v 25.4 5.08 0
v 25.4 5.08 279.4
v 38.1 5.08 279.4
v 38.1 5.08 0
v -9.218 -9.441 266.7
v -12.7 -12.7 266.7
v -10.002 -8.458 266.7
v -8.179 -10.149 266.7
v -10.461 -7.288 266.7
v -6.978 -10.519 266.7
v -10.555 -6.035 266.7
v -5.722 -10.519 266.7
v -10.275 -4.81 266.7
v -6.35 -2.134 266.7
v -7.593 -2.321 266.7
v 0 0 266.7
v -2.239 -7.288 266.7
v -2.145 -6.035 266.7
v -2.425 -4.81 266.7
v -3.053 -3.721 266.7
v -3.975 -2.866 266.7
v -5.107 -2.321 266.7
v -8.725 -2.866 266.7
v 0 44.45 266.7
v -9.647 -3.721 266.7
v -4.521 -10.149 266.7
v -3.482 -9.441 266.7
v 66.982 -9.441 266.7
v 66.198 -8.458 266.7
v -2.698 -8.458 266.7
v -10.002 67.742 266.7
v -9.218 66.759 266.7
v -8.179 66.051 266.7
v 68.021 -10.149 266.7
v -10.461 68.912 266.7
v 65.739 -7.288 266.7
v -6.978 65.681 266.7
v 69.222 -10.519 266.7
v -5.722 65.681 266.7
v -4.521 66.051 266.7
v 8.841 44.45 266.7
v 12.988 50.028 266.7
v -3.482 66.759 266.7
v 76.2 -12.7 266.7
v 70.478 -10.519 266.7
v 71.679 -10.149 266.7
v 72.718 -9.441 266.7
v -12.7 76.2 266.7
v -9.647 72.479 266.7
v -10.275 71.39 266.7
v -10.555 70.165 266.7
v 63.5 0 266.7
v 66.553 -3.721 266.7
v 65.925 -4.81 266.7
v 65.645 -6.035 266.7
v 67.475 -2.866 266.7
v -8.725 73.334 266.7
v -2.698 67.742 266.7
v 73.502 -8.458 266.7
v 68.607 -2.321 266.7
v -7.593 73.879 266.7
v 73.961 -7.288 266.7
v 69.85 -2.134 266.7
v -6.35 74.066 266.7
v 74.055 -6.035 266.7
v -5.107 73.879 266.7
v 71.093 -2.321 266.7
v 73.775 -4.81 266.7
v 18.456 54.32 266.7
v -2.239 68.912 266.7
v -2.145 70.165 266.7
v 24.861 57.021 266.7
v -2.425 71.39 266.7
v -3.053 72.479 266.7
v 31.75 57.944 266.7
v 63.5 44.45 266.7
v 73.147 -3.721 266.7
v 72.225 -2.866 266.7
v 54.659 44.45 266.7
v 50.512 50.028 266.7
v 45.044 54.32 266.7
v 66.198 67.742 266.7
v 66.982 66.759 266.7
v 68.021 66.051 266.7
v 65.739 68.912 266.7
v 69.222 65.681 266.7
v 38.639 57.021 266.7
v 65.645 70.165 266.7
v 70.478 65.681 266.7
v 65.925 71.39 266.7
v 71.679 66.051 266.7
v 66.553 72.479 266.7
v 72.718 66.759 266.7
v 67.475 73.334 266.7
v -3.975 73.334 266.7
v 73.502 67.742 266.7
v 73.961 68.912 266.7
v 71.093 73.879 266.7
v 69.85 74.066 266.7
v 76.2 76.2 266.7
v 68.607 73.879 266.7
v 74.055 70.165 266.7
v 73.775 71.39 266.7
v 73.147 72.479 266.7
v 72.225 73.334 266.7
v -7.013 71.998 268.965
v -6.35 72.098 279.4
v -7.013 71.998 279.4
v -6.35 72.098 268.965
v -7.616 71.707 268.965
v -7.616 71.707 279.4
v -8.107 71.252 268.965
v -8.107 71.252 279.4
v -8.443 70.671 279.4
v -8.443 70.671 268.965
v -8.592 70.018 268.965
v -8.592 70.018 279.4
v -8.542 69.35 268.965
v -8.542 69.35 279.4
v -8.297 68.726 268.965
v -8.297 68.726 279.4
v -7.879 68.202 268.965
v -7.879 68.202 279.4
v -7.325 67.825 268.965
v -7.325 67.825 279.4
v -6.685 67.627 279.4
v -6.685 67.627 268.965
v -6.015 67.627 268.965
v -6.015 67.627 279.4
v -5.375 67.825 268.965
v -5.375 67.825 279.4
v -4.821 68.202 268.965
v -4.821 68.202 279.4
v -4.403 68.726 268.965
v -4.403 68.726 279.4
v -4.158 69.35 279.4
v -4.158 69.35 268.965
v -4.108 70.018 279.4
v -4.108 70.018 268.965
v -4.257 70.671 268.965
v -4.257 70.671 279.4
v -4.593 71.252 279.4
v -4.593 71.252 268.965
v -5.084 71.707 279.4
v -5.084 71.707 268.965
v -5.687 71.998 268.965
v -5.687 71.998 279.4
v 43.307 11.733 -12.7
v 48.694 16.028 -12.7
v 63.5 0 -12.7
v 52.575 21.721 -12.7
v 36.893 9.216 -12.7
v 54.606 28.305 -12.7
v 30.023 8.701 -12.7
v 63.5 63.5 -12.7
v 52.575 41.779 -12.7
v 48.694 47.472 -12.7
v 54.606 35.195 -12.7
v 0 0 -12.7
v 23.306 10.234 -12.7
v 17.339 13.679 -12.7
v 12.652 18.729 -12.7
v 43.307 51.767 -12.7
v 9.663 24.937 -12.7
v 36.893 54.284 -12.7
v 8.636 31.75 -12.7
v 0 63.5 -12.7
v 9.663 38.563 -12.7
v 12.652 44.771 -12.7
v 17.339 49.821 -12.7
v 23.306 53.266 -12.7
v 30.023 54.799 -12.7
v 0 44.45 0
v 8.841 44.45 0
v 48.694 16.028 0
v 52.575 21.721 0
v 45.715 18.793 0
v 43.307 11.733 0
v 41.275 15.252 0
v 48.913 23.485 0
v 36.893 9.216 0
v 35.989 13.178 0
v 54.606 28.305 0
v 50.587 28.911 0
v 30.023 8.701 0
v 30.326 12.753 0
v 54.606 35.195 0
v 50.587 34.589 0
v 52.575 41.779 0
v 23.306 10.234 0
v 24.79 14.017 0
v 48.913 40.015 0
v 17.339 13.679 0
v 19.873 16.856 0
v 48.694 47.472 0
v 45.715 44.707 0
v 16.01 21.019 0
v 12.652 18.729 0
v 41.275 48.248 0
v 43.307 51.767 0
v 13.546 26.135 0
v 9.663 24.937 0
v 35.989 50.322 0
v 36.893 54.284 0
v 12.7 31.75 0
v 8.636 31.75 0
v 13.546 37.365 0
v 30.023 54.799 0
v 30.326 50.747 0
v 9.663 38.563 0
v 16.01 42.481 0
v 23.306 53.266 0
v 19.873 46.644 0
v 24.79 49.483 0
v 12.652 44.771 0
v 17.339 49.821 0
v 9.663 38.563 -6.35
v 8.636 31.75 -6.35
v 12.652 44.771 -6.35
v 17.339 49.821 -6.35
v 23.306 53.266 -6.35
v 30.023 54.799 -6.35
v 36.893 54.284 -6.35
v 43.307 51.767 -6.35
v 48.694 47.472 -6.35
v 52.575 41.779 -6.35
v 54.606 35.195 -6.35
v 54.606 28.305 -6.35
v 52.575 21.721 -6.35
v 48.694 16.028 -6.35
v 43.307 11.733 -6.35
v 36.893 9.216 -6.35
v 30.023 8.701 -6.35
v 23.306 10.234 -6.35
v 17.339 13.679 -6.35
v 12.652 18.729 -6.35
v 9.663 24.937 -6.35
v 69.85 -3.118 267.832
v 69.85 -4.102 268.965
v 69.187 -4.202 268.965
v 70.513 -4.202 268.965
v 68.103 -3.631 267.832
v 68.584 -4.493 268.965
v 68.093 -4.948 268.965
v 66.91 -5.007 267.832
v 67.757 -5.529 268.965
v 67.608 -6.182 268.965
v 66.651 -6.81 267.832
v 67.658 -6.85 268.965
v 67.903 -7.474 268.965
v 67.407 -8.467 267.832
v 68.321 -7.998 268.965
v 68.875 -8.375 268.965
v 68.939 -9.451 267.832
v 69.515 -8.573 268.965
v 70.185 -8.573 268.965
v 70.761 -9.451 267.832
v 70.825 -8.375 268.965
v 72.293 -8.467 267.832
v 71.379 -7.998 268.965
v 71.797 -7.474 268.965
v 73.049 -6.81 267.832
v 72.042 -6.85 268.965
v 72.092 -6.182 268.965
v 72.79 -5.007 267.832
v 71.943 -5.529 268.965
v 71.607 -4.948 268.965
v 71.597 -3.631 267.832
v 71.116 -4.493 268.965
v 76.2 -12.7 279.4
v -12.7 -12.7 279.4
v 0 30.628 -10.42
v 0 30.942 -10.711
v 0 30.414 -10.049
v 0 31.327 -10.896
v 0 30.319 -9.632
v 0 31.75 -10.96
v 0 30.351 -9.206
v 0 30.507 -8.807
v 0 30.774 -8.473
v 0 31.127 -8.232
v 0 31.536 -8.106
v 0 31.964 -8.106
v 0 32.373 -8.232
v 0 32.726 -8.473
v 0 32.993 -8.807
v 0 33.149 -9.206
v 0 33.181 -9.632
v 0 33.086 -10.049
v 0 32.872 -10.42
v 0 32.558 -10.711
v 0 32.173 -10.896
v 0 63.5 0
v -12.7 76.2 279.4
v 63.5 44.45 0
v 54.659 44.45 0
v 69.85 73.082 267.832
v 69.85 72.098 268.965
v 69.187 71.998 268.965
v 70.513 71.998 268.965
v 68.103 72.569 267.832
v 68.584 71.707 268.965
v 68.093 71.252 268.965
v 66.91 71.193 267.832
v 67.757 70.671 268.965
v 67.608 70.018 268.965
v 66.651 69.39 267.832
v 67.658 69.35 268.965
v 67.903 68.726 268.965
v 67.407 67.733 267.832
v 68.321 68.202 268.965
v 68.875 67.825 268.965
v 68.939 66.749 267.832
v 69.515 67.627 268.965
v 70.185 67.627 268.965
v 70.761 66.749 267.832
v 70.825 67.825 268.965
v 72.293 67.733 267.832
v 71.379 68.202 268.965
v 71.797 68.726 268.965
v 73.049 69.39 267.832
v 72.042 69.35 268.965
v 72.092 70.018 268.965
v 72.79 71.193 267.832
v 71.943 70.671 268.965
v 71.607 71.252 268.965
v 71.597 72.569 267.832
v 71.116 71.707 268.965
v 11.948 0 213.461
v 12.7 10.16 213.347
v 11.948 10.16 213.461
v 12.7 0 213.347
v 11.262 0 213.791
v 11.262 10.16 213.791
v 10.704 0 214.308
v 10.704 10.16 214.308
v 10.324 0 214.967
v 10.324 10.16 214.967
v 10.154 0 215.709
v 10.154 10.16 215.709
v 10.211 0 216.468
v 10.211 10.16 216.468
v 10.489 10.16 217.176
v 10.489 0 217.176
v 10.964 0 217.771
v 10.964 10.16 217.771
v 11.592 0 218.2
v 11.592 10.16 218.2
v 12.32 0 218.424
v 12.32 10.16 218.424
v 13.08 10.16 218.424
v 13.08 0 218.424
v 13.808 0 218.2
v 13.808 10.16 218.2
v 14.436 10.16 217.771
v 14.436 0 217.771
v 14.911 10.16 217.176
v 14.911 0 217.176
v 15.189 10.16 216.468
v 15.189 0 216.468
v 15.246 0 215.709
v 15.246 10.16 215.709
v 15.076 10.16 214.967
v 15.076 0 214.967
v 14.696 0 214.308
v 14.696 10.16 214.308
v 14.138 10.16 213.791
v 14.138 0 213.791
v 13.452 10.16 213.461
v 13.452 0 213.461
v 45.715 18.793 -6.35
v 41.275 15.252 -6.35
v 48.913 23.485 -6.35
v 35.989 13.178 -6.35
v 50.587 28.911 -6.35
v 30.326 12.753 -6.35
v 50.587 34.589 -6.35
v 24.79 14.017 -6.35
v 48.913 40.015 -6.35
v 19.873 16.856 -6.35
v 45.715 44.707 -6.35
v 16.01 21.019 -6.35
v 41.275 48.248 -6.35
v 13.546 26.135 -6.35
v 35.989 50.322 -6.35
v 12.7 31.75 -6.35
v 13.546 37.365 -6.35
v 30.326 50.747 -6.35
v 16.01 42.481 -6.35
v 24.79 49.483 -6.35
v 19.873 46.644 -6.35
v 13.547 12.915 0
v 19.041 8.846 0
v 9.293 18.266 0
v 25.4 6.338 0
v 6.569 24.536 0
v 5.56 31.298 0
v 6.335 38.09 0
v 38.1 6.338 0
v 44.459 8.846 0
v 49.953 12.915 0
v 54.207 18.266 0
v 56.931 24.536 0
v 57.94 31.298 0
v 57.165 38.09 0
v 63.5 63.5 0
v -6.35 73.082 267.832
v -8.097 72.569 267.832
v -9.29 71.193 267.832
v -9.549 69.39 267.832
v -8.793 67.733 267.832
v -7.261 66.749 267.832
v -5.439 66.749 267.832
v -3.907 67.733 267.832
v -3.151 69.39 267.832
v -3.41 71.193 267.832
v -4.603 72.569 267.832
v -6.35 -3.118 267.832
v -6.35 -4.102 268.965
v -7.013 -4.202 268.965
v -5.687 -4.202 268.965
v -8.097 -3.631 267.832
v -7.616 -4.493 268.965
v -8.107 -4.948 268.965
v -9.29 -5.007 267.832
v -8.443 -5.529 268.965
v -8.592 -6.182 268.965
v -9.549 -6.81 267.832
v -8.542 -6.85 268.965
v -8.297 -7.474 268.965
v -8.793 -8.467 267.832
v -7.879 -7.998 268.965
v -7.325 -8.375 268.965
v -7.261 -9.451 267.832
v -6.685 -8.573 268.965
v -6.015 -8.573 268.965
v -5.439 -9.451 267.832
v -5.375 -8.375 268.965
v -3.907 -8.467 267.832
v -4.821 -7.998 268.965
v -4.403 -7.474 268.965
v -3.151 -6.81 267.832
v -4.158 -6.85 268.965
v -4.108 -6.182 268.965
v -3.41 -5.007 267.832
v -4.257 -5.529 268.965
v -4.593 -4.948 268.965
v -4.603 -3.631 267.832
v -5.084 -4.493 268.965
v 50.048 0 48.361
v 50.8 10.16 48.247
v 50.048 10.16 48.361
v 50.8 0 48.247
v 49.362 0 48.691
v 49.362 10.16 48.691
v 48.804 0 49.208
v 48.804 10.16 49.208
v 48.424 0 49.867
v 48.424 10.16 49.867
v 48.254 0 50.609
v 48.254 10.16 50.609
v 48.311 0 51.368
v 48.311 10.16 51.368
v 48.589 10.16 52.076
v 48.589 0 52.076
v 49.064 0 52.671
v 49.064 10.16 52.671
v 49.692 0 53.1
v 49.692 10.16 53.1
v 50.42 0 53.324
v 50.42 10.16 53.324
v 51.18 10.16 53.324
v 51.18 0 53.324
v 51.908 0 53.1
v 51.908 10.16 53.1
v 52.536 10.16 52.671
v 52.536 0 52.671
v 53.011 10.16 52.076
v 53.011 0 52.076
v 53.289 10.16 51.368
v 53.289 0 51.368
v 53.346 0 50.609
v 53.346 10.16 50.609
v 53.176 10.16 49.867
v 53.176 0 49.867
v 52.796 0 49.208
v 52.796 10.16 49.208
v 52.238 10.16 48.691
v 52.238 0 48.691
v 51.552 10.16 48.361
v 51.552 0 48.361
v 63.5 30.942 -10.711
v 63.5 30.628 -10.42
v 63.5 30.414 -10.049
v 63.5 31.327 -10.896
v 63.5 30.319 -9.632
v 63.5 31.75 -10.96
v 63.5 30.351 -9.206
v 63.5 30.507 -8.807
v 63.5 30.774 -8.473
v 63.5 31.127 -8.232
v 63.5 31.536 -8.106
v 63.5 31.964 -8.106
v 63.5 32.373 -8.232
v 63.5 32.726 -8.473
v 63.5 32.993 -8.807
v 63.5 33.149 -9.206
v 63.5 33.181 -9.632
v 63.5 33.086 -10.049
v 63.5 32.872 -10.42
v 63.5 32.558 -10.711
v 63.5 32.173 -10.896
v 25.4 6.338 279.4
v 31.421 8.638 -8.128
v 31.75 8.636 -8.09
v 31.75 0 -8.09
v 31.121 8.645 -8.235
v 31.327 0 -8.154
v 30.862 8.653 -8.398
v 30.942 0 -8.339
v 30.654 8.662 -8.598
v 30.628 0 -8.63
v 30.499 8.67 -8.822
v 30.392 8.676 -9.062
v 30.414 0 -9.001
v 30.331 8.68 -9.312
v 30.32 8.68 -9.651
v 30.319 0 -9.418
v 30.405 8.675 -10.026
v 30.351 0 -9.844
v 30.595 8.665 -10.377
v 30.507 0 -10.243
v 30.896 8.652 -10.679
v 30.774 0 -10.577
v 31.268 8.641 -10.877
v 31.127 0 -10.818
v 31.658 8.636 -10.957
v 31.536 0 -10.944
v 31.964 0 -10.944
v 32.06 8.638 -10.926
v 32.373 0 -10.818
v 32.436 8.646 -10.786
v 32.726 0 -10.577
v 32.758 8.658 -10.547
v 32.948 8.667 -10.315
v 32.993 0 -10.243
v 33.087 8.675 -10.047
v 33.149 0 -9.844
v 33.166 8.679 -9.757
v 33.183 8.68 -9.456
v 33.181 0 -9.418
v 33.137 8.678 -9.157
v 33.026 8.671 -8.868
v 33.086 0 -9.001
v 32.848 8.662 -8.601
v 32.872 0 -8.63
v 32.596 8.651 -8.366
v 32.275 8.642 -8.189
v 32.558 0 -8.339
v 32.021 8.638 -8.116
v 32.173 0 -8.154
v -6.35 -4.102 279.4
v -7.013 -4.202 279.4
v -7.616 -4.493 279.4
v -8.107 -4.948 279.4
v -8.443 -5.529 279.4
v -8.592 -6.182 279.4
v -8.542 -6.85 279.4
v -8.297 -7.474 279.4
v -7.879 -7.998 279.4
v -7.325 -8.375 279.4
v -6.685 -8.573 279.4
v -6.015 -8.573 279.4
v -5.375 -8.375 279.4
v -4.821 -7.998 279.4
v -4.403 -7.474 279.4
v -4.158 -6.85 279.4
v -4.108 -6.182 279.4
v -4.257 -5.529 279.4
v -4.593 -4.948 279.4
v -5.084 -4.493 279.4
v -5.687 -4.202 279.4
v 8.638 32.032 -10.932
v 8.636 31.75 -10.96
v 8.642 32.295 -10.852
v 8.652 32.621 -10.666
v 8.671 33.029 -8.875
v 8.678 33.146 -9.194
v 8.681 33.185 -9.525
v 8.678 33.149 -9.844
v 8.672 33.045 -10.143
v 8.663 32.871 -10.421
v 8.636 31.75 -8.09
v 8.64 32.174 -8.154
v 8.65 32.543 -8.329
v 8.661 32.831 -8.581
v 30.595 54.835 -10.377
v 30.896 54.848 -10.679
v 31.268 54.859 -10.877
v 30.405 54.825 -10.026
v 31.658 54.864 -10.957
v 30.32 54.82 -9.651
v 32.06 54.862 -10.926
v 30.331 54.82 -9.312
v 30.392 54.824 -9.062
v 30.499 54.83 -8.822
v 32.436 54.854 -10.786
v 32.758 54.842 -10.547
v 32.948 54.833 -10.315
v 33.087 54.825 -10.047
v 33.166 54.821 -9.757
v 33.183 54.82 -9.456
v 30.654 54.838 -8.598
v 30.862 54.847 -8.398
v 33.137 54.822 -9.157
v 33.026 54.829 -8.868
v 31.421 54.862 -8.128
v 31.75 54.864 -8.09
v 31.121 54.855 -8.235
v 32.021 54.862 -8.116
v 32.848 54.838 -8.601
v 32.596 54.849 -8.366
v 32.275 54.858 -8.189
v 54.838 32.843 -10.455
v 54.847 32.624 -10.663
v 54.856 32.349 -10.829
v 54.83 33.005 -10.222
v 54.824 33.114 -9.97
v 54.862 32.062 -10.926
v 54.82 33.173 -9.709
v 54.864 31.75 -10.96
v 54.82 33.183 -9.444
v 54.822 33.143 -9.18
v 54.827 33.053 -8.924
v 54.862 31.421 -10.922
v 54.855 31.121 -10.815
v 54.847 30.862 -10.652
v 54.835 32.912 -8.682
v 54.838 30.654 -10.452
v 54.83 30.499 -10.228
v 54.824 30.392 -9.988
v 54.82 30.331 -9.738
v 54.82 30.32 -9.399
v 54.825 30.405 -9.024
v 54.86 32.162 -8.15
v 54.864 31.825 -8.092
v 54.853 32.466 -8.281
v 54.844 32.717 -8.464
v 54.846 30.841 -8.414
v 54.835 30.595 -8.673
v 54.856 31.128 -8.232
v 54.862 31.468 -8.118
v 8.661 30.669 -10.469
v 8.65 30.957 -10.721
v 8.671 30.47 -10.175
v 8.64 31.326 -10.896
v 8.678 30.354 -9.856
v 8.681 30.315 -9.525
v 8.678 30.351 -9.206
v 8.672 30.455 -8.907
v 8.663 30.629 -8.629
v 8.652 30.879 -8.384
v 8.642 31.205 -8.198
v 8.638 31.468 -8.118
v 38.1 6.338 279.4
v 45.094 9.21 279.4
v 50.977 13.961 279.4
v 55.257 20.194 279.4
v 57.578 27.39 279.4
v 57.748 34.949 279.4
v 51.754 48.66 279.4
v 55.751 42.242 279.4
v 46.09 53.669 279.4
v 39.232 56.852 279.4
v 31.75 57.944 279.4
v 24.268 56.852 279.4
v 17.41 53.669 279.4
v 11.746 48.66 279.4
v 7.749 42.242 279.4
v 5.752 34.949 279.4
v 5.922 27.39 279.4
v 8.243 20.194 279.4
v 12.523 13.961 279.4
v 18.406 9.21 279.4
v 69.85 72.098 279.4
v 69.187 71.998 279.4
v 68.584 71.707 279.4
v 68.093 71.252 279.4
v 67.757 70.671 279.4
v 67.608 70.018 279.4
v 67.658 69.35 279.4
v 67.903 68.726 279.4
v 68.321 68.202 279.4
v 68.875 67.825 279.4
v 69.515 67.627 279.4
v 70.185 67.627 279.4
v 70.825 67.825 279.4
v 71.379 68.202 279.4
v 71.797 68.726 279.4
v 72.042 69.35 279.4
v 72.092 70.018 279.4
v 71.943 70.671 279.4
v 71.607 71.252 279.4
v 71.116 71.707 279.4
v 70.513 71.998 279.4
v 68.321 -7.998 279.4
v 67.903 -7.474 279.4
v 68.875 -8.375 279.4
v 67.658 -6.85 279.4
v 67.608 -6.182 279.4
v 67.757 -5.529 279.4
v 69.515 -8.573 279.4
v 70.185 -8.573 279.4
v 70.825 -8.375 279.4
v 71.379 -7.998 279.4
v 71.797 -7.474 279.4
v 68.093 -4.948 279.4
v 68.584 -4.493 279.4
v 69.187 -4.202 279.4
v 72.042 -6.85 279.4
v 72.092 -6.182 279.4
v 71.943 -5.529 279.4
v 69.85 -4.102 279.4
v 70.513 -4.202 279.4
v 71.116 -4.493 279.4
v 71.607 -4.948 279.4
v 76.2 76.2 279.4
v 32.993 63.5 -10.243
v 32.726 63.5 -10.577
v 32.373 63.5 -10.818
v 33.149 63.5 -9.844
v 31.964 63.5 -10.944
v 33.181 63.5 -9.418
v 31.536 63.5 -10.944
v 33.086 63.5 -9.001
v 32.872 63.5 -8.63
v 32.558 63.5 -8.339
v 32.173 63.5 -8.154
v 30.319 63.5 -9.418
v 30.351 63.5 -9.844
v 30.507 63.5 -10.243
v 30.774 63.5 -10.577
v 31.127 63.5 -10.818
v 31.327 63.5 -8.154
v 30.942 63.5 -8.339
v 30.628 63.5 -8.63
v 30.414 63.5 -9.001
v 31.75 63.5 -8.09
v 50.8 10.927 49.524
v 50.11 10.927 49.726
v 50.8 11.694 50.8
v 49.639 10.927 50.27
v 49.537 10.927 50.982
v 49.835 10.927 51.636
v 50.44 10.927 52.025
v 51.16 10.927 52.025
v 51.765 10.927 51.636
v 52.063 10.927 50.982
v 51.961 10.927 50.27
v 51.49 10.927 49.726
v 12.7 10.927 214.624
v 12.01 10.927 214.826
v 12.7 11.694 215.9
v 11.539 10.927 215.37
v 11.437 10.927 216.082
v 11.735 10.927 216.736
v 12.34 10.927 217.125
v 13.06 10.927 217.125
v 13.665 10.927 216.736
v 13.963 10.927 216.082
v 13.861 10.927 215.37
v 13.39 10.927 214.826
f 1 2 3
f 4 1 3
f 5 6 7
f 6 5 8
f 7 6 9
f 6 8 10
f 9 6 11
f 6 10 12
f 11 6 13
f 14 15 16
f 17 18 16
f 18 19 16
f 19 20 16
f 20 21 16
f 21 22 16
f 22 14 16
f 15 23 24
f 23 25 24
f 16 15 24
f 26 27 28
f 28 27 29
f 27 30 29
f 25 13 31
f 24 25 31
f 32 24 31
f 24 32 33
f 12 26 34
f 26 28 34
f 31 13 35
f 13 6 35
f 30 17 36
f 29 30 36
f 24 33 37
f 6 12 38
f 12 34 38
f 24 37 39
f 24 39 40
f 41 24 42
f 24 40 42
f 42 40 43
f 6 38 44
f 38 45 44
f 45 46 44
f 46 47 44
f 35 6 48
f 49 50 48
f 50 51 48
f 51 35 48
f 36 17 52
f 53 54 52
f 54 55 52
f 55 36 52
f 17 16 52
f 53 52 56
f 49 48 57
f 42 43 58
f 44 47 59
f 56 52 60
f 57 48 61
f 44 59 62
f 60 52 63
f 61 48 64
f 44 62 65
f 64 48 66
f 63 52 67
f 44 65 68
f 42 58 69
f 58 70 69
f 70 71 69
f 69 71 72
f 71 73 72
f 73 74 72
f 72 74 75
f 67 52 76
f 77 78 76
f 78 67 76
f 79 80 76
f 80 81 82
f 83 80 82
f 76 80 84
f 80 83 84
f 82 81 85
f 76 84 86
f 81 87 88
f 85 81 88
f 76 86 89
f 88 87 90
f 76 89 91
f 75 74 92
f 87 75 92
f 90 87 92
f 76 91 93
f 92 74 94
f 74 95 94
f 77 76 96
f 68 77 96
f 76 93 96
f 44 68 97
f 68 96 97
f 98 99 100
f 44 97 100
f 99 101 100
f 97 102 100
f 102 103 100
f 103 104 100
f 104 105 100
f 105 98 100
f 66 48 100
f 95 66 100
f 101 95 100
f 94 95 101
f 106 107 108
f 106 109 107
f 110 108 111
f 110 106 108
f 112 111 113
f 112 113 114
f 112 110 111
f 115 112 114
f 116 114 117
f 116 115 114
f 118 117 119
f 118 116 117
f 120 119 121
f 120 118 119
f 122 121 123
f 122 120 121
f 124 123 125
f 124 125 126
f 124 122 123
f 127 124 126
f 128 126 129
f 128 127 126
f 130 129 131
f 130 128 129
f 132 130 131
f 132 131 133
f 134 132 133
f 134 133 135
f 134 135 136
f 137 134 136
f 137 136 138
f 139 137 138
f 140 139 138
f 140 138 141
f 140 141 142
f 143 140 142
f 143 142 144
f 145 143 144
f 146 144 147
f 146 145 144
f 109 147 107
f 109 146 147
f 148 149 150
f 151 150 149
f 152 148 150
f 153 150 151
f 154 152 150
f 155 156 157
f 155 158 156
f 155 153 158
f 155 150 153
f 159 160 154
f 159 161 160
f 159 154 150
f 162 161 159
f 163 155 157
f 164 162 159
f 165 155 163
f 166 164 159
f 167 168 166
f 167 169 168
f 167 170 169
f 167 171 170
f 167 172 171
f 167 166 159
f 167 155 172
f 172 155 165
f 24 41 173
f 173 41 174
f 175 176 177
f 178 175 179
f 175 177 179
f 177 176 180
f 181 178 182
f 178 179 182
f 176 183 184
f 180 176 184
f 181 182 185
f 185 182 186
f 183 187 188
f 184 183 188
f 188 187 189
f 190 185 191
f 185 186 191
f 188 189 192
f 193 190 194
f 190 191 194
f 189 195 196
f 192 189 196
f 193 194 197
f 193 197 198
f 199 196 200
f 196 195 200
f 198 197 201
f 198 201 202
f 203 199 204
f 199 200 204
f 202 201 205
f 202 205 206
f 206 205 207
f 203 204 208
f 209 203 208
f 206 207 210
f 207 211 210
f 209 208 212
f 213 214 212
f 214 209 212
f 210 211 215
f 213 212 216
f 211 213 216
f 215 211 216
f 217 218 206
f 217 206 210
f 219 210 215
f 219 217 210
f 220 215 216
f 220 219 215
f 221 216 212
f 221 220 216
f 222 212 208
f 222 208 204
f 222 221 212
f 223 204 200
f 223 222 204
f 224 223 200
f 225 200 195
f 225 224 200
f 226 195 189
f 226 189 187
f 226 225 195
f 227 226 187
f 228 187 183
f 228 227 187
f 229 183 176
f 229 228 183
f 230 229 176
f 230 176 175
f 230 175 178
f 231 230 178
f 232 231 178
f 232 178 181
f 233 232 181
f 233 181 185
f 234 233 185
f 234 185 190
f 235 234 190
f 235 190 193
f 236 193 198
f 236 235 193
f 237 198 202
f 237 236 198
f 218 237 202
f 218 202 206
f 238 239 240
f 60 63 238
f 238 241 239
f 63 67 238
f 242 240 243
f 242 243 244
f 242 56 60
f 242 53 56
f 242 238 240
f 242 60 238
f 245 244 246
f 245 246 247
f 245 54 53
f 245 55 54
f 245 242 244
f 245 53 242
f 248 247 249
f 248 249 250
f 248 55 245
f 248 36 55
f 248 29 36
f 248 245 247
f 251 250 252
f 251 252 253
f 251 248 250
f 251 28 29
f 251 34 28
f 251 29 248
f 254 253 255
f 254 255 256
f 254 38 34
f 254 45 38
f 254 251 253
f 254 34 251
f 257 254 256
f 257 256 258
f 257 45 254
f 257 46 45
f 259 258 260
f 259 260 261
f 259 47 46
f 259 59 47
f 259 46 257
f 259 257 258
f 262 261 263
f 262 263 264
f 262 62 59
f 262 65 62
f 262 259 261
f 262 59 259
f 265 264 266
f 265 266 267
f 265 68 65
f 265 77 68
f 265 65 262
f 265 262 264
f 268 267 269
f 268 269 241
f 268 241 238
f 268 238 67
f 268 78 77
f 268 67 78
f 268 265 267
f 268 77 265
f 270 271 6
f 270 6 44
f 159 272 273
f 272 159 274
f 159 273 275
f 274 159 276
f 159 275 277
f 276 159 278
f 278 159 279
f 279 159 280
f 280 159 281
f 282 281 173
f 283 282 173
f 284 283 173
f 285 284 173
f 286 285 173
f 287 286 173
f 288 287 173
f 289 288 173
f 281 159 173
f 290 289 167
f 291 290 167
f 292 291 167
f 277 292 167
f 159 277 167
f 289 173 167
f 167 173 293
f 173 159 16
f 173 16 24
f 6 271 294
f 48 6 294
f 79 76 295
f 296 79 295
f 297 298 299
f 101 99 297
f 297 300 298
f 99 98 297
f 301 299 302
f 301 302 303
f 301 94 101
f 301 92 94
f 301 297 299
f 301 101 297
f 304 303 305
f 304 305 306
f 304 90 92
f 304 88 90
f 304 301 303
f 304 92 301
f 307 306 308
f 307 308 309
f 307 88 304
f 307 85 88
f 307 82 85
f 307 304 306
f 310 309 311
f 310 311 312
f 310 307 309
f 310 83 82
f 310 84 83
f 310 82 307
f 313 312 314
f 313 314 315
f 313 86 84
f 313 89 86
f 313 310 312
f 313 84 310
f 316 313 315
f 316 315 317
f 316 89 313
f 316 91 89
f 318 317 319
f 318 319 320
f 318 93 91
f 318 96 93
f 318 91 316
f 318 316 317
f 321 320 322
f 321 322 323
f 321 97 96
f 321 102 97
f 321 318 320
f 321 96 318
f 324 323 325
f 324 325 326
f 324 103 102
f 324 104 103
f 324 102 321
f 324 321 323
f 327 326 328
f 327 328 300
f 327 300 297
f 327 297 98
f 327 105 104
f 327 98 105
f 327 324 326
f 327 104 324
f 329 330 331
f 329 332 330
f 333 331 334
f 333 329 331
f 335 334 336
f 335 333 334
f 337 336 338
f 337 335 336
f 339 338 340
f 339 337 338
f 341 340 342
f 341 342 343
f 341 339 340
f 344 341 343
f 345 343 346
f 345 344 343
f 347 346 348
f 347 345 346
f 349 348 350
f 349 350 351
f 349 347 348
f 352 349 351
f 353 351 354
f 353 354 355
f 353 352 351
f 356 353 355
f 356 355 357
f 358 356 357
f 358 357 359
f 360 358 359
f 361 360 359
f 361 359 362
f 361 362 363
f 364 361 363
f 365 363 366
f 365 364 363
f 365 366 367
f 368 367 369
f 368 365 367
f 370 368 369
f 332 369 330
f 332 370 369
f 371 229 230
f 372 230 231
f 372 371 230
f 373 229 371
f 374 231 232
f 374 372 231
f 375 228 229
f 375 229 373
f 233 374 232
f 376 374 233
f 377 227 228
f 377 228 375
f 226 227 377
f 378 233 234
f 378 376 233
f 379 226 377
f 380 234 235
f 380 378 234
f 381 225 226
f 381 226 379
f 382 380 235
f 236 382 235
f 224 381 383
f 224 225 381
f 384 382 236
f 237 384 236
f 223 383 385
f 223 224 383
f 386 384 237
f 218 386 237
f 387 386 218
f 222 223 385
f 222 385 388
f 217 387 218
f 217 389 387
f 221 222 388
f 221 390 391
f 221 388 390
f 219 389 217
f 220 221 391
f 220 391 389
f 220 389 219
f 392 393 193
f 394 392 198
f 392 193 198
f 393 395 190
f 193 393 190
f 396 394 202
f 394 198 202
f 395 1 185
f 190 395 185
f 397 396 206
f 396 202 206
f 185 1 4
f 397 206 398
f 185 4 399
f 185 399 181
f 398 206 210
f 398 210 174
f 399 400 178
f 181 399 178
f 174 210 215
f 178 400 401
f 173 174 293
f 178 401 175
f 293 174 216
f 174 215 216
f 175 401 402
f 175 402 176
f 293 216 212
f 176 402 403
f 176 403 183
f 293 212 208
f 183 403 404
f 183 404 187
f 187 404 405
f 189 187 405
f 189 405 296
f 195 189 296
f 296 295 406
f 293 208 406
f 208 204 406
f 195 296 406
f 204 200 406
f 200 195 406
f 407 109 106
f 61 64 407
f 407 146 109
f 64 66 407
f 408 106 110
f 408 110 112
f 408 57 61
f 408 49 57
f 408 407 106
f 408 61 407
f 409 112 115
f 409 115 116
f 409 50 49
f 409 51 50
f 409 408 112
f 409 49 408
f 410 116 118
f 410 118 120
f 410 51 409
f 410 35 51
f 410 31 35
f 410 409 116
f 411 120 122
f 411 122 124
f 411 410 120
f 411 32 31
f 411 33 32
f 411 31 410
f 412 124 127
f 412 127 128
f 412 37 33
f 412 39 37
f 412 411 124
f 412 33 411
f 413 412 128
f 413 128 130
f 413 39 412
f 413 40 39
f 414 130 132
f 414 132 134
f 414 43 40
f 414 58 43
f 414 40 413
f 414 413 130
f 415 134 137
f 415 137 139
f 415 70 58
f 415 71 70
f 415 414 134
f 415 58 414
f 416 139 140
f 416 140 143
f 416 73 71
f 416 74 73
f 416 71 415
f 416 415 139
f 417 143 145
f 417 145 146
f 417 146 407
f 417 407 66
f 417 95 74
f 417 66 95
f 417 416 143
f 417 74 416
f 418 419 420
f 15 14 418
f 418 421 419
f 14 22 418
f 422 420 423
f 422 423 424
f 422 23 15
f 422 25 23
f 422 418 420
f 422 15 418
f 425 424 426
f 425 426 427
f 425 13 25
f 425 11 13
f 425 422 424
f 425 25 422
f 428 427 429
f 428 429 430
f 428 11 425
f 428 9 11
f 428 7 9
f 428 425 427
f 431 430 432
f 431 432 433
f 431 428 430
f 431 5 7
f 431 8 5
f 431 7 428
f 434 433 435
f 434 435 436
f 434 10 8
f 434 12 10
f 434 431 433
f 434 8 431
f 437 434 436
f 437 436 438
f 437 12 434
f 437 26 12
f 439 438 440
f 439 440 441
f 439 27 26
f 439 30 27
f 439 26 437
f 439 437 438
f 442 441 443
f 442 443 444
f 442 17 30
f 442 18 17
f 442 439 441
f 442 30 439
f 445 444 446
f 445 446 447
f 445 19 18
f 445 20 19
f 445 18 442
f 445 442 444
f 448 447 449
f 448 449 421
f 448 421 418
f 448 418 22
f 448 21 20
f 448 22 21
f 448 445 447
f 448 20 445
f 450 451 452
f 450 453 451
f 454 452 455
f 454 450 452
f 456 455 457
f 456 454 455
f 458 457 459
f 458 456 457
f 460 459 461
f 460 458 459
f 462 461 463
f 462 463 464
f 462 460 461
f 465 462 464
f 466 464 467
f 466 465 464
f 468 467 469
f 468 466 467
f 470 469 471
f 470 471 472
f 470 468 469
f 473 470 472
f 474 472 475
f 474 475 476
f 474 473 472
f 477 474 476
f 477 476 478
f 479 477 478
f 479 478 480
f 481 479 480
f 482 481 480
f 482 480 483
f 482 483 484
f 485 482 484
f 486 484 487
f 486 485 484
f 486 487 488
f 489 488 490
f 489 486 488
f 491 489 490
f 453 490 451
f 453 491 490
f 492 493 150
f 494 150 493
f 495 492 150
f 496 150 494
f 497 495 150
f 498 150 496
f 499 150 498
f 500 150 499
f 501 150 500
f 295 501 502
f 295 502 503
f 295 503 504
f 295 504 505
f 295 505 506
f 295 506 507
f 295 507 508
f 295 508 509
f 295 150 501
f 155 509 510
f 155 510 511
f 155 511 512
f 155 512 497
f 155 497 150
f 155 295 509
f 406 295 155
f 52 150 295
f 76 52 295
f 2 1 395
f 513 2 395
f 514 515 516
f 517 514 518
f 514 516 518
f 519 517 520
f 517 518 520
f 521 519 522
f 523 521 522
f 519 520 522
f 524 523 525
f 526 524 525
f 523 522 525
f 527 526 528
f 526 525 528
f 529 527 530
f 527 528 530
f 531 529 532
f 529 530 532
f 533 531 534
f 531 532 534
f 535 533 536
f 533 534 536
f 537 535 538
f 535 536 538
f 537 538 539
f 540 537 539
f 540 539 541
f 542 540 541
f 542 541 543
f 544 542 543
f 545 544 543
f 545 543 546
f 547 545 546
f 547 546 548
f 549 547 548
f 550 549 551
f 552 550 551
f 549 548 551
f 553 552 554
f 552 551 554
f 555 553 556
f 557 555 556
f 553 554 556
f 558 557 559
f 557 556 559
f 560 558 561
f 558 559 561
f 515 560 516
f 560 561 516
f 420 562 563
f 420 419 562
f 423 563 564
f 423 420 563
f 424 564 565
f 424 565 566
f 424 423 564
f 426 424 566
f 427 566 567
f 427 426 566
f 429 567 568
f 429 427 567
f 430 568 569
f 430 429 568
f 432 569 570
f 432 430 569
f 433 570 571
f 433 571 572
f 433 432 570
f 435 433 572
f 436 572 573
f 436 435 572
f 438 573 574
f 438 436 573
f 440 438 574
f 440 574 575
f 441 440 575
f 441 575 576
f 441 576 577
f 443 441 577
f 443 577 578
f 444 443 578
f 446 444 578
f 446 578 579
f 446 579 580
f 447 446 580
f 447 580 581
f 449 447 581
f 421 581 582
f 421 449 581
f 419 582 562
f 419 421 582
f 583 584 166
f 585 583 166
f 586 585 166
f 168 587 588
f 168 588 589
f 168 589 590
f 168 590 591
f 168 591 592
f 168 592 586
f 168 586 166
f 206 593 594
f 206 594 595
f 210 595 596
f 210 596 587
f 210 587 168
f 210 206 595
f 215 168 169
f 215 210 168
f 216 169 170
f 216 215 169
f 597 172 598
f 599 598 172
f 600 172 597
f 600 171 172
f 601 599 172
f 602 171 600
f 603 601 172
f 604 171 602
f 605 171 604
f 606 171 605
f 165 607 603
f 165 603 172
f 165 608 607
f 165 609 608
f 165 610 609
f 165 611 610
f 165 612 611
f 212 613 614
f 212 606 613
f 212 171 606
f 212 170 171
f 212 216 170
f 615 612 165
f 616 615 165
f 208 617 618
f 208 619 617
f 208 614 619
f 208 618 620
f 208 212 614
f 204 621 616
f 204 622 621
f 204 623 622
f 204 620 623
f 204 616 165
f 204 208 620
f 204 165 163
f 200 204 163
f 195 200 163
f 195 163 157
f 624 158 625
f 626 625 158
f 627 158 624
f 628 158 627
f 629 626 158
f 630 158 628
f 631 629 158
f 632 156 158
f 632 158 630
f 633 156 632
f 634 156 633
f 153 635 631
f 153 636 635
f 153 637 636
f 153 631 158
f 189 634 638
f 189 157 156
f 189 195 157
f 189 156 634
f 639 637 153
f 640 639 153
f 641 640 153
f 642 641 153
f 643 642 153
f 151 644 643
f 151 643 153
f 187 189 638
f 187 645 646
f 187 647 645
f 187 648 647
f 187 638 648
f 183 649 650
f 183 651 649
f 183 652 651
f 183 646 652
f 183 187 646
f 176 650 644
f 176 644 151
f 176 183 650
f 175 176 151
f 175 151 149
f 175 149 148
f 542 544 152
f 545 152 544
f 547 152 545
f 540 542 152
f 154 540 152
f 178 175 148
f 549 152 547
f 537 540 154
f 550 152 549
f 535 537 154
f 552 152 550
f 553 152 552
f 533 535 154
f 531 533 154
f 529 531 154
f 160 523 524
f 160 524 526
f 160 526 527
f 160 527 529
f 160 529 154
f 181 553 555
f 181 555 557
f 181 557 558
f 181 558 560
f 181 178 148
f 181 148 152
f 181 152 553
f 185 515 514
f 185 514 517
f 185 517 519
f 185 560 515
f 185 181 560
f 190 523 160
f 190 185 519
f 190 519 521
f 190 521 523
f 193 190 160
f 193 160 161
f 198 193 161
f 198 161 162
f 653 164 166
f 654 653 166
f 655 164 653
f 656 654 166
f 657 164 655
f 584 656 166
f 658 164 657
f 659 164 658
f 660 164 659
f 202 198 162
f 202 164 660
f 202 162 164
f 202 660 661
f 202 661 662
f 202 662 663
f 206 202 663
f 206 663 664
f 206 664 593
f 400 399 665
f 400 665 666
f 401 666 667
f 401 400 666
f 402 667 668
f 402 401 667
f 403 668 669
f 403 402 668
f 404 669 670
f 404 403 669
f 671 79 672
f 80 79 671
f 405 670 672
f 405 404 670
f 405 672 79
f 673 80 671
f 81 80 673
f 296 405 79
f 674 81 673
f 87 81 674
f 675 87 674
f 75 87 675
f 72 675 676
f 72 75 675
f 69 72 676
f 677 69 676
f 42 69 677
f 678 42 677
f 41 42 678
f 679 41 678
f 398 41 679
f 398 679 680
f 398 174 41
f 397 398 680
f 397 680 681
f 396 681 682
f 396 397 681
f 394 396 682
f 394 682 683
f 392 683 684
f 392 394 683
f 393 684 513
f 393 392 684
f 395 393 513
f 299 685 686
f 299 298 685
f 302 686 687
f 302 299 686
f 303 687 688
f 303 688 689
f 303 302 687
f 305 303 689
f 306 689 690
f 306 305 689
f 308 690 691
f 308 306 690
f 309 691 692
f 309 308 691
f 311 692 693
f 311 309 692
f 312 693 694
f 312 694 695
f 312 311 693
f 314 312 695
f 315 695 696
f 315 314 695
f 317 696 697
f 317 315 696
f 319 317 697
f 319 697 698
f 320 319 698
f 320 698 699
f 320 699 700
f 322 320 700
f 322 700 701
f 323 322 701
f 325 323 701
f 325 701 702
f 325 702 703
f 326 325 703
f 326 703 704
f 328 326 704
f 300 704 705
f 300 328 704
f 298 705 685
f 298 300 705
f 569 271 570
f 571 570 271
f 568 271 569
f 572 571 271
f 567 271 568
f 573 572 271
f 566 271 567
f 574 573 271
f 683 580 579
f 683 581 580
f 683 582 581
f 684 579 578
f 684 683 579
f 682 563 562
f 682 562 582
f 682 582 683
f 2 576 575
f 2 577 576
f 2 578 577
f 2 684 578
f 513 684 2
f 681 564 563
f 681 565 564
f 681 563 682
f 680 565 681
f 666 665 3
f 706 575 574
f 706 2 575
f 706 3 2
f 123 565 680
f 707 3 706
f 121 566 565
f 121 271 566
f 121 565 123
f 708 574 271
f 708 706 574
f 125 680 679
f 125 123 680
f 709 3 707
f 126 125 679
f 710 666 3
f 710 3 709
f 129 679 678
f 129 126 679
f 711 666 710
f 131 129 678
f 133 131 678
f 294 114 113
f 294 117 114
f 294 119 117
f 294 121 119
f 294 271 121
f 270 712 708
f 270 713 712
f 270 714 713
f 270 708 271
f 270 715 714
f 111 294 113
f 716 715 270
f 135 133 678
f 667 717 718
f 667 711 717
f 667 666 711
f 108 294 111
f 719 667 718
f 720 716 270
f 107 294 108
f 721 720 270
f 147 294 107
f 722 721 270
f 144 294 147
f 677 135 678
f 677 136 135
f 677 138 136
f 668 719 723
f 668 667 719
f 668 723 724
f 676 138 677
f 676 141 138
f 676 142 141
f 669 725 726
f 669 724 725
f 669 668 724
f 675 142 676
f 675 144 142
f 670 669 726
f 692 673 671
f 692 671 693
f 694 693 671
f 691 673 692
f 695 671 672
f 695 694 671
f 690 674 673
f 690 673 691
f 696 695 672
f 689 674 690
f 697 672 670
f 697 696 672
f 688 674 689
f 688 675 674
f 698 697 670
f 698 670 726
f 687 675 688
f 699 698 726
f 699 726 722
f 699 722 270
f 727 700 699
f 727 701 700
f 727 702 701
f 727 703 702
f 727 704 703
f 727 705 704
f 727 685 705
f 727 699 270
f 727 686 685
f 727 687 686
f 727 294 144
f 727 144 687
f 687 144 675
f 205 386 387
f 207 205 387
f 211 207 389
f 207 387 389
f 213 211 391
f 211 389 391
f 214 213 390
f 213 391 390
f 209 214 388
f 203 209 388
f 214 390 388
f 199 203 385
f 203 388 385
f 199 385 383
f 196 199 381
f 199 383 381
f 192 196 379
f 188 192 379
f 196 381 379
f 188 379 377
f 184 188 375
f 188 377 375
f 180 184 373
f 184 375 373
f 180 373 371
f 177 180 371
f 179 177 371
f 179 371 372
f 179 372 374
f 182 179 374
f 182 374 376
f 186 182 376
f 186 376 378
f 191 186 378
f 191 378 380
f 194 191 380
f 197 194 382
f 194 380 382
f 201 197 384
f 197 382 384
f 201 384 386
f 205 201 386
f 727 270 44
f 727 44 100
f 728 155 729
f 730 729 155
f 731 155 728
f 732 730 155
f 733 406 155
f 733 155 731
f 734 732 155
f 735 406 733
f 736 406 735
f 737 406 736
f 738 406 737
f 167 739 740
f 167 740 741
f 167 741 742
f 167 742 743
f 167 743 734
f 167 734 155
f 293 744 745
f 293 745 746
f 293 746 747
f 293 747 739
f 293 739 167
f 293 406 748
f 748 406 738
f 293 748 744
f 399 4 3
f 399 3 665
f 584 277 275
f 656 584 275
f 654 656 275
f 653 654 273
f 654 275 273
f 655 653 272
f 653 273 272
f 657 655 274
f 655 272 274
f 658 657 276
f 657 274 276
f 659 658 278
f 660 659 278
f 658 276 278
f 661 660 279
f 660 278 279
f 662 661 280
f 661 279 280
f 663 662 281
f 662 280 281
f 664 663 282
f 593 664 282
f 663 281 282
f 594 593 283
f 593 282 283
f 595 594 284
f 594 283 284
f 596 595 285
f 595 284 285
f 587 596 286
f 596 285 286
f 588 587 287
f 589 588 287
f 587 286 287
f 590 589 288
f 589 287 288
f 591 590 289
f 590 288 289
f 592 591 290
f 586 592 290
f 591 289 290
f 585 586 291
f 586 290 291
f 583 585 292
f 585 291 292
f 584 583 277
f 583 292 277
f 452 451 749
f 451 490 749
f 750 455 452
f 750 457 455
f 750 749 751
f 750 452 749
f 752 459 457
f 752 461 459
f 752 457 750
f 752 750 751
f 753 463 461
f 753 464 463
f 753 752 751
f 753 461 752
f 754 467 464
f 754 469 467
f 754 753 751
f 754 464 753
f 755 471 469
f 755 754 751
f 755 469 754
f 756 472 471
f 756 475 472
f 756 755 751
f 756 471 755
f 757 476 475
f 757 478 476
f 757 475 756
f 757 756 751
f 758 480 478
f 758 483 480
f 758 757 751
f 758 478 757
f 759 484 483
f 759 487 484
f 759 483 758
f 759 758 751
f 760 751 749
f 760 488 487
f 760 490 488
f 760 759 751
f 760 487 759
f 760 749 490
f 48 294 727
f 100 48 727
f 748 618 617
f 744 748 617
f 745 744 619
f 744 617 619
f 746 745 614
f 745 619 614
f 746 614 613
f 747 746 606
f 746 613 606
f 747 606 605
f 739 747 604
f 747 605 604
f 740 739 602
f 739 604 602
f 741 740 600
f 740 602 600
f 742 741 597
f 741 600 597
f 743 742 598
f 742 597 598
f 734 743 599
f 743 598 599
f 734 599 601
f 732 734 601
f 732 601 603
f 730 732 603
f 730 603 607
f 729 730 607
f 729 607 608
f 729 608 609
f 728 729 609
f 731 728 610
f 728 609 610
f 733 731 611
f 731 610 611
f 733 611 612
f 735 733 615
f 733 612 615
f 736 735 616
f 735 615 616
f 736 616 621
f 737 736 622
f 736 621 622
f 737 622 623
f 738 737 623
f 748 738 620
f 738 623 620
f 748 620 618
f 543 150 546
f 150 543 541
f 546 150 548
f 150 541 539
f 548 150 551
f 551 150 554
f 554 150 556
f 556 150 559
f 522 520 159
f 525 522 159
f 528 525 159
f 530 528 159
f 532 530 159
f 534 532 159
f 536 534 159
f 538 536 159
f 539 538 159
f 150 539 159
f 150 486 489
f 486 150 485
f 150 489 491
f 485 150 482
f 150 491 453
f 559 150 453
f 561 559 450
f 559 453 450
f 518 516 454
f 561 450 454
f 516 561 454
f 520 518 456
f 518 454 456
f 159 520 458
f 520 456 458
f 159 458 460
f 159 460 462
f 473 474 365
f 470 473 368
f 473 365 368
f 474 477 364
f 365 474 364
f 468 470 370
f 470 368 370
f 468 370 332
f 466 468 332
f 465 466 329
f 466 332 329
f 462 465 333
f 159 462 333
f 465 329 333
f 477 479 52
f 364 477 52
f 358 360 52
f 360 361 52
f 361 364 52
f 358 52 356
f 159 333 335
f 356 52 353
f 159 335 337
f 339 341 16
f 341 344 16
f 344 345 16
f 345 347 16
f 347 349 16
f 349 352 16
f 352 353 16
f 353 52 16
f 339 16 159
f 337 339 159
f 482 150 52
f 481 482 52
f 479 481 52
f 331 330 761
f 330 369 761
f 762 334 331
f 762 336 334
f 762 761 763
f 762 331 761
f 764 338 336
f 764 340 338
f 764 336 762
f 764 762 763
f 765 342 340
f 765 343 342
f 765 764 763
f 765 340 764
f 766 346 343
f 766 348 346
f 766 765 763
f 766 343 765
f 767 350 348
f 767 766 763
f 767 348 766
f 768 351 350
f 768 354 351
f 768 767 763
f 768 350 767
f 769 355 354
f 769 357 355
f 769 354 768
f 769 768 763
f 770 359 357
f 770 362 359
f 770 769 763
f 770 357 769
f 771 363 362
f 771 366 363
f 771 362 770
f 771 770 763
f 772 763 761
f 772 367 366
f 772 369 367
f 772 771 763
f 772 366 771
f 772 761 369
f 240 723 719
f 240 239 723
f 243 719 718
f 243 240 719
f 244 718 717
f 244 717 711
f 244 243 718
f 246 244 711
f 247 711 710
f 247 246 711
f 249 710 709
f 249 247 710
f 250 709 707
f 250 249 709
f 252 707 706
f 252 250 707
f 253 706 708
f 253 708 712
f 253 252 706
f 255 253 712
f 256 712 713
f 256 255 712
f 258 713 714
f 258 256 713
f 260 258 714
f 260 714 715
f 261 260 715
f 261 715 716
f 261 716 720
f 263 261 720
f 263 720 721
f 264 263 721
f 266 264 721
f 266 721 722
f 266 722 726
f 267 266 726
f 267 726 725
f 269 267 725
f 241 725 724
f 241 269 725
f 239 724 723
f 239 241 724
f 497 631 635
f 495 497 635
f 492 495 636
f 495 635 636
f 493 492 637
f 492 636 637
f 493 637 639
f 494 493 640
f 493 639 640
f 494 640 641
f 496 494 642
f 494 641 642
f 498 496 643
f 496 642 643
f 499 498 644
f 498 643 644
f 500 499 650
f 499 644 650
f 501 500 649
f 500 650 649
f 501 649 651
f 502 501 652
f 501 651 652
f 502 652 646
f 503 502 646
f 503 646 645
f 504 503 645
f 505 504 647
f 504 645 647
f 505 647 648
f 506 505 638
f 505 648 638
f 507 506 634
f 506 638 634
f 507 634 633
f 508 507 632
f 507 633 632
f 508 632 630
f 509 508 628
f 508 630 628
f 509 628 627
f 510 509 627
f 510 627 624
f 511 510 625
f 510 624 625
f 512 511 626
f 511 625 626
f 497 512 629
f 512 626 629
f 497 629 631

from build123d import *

# Parameters (mm, degrees)
SKETCH2_W                                     = 63.5
SKETCH2_H                                     = 63.5
SKETCH2_R                                     = 26.19375
BOSS_EXTRUDE1_DEPTH                           = 279.4
SKETCH3_W                                     = 88.9
SKETCH3_H                                     = 88.9
SKETCH3_R                                     = 26.19375
BOSS_EXTRUDE2_DEPTH                           = 12.7
SKETCH4_W                                     = 63.5
SKETCH4_H                                     = 63.5
SKETCH4_R                                     = 23.114
BOSS_EXTRUDE3_DEPTH                           = 12.7
SKETCH5_R                                     = 23.114
SKETCH5_R_2                                   = 19.05
BOSS_EXTRUDE4_DEPTH                           = 6.35
SKETCH7_W                                     = 266.7
SKETCH7_H                                     = 19.05
CUT_EXTRUDE2_DEPTH                            = 77.2
SKETCH8_W                                     = 1.4351
SKETCH8_H                                     = 76.2
SKETCH10_W                                    = 1.4351
SKETCH10_H                                    = 76.2
CSK_FOR_8_FLAT_HEAD_MACHINE_SCREW1_AT_2_COUNT = 2
CSK_FOR_8_FLAT_HEAD_MACHINE_SCREW1_AT_2_PITCH = 76.2
CSK_FOR_8_FLAT_HEAD_MACHINE_SCREW1_AT_3_COUNT = 2
CSK_FOR_8_FLAT_HEAD_MACHINE_SCREW1_AT_3_PITCH = 107.763073453
CSK_FOR_8_FLAT_HEAD_MACHINE_SCREW1_AT_4_COUNT = 2
CSK_FOR_8_FLAT_HEAD_MACHINE_SCREW1_AT_4_PITCH = 76.2
SKETCH16_W                                    = 12.7
SKETCH16_H                                    = 2.6035
CUT_EXTRUDE3_DEPTH                            = 279.4
F_1_4_20_TAPPED_HOLE1_AT_2_COUNT              = 2
F_1_4_20_TAPPED_HOLE1_AT_2_PITCH              = 169.439133614


with BuildPart() as part:
    # Sketch2 → Boss-Extrude1 (new body)
    with BuildSketch(Plane.XY):
        with Locations((31.75, 31.75)):
            Rectangle(SKETCH2_W, SKETCH2_H)
        with Locations((31.75, 31.75)):
            Circle(SKETCH2_R, mode=Mode.SUBTRACT)
    extrude(amount=BOSS_EXTRUDE1_DEPTH)

    # Sketch3 → Boss-Extrude2 (add)
    with BuildSketch(Plane.XY.offset(279.4)):
        with Locations((31.75, 31.75)):
            Rectangle(SKETCH3_W, SKETCH3_H)
        with Locations((31.75, 31.75)):
            Circle(SKETCH3_R, mode=Mode.SUBTRACT)
    extrude(amount=-BOSS_EXTRUDE2_DEPTH)

    # Sketch4 → Boss-Extrude3 (add)
    with BuildSketch(Plane(origin=(0, 0, 0), x_dir=(-1, 0, 0), z_dir=(0, 0, -1))):
        with Locations((-31.75, 31.75)):
            Rectangle(SKETCH4_W, SKETCH4_H)
        with Locations((-31.75, 31.75)):
            Circle(SKETCH4_R, mode=Mode.SUBTRACT)
    extrude(amount=BOSS_EXTRUDE3_DEPTH)

    # Sketch7 → Cut-Extrude2 (cut, through all)
    with BuildSketch(Plane(origin=(63.5, 0, 0), x_dir=(0, 0, -1), z_dir=(1, 0, 0))):
        with Locations((-133.35, 53.975)):
            Rectangle(SKETCH7_W, SKETCH7_H)
    extrude(amount=-CUT_EXTRUDE2_DEPTH, mode=Mode.SUBTRACT)

    # Sketch8 → #6-40 Tapped Hole1 (revolve, cut)
    with BuildSketch(Plane(origin=(63.5, 31.75, -9.525), x_dir=(0, 0, -1), z_dir=(0, 1, 0))):
        with Locations((0.71755, 38.1)):
            Rectangle(SKETCH8_W, SKETCH8_H)
    revolve(axis=Axis((69.85, 31.75, -9.525), (-1, 0, 0)), mode=Mode.SUBTRACT)

    # Sketch10 → #6-40 Tapped Hole2 (revolve, cut)
    with BuildSketch(Plane(origin=(31.75, 63.5, -9.525), x_dir=(0, 0, 1), z_dir=(1, 0, 0))):
        with Locations((0.71755, 38.1)):
            Rectangle(SKETCH10_W, SKETCH10_H)
    revolve(axis=Axis((31.75, 69.85, -9.525), (0, -1, 0)), mode=Mode.SUBTRACT)

    # Sketch12 → CSK for #8 Flat Head Machine Screw1 (revolve, cut)
    with BuildSketch(Plane(origin=(69.85, 69.85, 266.7), x_dir=(0, 1, 0), z_dir=(1, 0, 0))):
        Polygon((0, 0), (0, 12.7), (2.2479, 12.7), (2.2479, 2.26450021), (4.2164, 0), align=None)
    csk_for_8_flat_head_machine_screw1 = revolve(axis=Axis((69.85, 69.85, 260.35), (0, 0, 1)), mode=Mode.SUBTRACT)

    # CSK for #8 Flat Head Machine Screw1 at 2: CSK for #8 Flat Head Machine Screw1 ×2
    with Locations(*[(-i * CSK_FOR_8_FLAT_HEAD_MACHINE_SCREW1_AT_2_PITCH, 0, 0) for i in range(1, CSK_FOR_8_FLAT_HEAD_MACHINE_SCREW1_AT_2_COUNT)]):
        add(csk_for_8_flat_head_machine_screw1, mode=Mode.SUBTRACT)

    # CSK for #8 Flat Head Machine Screw1 at 3: CSK for #8 Flat Head Machine Screw1 ×2
    with Locations(*[Vector(-0.707106781, -0.707106781, 0) * (i * CSK_FOR_8_FLAT_HEAD_MACHINE_SCREW1_AT_3_PITCH) for i in range(1, CSK_FOR_8_FLAT_HEAD_MACHINE_SCREW1_AT_3_COUNT)]):
        add(csk_for_8_flat_head_machine_screw1, mode=Mode.SUBTRACT)

    # CSK for #8 Flat Head Machine Screw1 at 4: CSK for #8 Flat Head Machine Screw1 ×2
    with Locations(*[(0, -i * CSK_FOR_8_FLAT_HEAD_MACHINE_SCREW1_AT_4_PITCH, 0) for i in range(1, CSK_FOR_8_FLAT_HEAD_MACHINE_SCREW1_AT_4_COUNT)]):
        add(csk_for_8_flat_head_machine_screw1, mode=Mode.SUBTRACT)

    # Sketch16 → Cut-Extrude3 (cut)
    with BuildSketch(Plane.XY.offset(279.4)):
        with Locations((31.75, 6.38175)):
            Rectangle(SKETCH16_W, SKETCH16_H)
    extrude(amount=-CUT_EXTRUDE3_DEPTH, mode=Mode.SUBTRACT)

    # Sketch19 → 1/4-20 Tapped Hole1 (revolve, cut)
    with BuildSketch(Plane(origin=(50.8, 0, 50.8), x_dir=(0, 0, -1), z_dir=(1, 0, 0))):
        Polygon((0, 0), (0, 11.693816902), (2.5527, 10.16), (2.5527, 0), align=None)
    f_1_4_20_tapped_hole1 = revolve(axis=Axis((50.8, -6.35, 50.8), (0, 1, 0)), mode=Mode.SUBTRACT)

    # 1/4-20 Tapped Hole1 at 2: 1/4-20 Tapped Hole1 ×2
    with Locations(*[Vector(-0.224859507, 0, 0.974391196) * (i * F_1_4_20_TAPPED_HOLE1_AT_2_PITCH) for i in range(1, F_1_4_20_TAPPED_HOLE1_AT_2_COUNT)]):
        add(f_1_4_20_tapped_hole1, mode=Mode.SUBTRACT)


with BuildPart() as body_2:
    # Sketch5 → Boss-Extrude4 (new body)
    with BuildSketch(Plane(origin=(0, 0, -6.35), x_dir=(-1, 0, 0), z_dir=(0, 0, -1))):
        with Locations((-31.75, 31.75)):
            Circle(SKETCH5_R)
        with Locations((-31.75, 31.75)):
            Circle(SKETCH5_R_2, mode=Mode.SUBTRACT)
    extrude(amount=-BOSS_EXTRUDE4_DEPTH)


solid = Compound([part.part, body_2.part])
